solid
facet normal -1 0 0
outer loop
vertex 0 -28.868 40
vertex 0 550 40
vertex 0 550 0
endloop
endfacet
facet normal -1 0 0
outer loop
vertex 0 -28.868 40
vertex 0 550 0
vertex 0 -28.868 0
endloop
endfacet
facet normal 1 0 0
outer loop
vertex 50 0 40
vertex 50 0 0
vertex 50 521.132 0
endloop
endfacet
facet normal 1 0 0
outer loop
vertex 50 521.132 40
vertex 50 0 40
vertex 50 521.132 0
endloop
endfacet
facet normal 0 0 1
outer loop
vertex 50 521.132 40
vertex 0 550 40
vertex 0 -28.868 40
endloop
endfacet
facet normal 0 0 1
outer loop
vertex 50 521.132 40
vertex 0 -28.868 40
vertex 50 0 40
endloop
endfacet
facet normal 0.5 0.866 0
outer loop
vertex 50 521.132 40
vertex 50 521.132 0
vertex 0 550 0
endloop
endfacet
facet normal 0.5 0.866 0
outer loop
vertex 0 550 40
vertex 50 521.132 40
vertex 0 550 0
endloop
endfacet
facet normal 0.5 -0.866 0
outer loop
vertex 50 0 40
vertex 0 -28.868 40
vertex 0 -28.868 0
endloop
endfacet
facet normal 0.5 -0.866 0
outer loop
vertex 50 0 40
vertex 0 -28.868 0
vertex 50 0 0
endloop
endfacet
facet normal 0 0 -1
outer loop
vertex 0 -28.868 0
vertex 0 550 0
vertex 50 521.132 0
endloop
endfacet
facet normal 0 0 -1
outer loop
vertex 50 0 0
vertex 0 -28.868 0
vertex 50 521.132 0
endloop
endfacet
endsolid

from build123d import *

# Parameters (mm, degrees)
ESQUISSE1_W                  = 50
ESQUISSE1_H                  = 550
BOSS_EXTRU_1_DEPTH           = 40
BOSS_EXTRU_2_DEPTH           = 40
ENL_V_MAT_EXTRU_1_DEPTH      = 554.714727996
ENL_V_MAT_EXTRU_1_DEPTH_BACK = 554.714727996


with BuildPart() as part:
    # Esquisse1 → Boss.-Extru.1 (new body)
    with BuildSketch(Plane.XY):
        with Locations((25, 275)):
            Rectangle(ESQUISSE1_W, ESQUISSE1_H)
    extrude(amount=BOSS_EXTRU_1_DEPTH)

    # Esquisse2 → Boss.-Extru.2 (add)
    with BuildSketch(Plane.XY.offset(40)):
        Polygon((50, 0), (0, 0), (0, -28.867513459), align=None)
    extrude(amount=-BOSS_EXTRU_2_DEPTH)

    # Esquisse3 → Enlèv. mat.-Extru.1 (cut, two sides: drawn at the far end of the back side and taken through both)
    with BuildSketch(Plane.XY.offset(40).offset(-ENL_V_MAT_EXTRU_1_DEPTH_BACK)):
        Polygon((50, 521.132486541), (0, 550), (50, 550), align=None)
    extrude(amount=ENL_V_MAT_EXTRU_1_DEPTH + ENL_V_MAT_EXTRU_1_DEPTH_BACK, mode=Mode.SUBTRACT)


solid = part.part
